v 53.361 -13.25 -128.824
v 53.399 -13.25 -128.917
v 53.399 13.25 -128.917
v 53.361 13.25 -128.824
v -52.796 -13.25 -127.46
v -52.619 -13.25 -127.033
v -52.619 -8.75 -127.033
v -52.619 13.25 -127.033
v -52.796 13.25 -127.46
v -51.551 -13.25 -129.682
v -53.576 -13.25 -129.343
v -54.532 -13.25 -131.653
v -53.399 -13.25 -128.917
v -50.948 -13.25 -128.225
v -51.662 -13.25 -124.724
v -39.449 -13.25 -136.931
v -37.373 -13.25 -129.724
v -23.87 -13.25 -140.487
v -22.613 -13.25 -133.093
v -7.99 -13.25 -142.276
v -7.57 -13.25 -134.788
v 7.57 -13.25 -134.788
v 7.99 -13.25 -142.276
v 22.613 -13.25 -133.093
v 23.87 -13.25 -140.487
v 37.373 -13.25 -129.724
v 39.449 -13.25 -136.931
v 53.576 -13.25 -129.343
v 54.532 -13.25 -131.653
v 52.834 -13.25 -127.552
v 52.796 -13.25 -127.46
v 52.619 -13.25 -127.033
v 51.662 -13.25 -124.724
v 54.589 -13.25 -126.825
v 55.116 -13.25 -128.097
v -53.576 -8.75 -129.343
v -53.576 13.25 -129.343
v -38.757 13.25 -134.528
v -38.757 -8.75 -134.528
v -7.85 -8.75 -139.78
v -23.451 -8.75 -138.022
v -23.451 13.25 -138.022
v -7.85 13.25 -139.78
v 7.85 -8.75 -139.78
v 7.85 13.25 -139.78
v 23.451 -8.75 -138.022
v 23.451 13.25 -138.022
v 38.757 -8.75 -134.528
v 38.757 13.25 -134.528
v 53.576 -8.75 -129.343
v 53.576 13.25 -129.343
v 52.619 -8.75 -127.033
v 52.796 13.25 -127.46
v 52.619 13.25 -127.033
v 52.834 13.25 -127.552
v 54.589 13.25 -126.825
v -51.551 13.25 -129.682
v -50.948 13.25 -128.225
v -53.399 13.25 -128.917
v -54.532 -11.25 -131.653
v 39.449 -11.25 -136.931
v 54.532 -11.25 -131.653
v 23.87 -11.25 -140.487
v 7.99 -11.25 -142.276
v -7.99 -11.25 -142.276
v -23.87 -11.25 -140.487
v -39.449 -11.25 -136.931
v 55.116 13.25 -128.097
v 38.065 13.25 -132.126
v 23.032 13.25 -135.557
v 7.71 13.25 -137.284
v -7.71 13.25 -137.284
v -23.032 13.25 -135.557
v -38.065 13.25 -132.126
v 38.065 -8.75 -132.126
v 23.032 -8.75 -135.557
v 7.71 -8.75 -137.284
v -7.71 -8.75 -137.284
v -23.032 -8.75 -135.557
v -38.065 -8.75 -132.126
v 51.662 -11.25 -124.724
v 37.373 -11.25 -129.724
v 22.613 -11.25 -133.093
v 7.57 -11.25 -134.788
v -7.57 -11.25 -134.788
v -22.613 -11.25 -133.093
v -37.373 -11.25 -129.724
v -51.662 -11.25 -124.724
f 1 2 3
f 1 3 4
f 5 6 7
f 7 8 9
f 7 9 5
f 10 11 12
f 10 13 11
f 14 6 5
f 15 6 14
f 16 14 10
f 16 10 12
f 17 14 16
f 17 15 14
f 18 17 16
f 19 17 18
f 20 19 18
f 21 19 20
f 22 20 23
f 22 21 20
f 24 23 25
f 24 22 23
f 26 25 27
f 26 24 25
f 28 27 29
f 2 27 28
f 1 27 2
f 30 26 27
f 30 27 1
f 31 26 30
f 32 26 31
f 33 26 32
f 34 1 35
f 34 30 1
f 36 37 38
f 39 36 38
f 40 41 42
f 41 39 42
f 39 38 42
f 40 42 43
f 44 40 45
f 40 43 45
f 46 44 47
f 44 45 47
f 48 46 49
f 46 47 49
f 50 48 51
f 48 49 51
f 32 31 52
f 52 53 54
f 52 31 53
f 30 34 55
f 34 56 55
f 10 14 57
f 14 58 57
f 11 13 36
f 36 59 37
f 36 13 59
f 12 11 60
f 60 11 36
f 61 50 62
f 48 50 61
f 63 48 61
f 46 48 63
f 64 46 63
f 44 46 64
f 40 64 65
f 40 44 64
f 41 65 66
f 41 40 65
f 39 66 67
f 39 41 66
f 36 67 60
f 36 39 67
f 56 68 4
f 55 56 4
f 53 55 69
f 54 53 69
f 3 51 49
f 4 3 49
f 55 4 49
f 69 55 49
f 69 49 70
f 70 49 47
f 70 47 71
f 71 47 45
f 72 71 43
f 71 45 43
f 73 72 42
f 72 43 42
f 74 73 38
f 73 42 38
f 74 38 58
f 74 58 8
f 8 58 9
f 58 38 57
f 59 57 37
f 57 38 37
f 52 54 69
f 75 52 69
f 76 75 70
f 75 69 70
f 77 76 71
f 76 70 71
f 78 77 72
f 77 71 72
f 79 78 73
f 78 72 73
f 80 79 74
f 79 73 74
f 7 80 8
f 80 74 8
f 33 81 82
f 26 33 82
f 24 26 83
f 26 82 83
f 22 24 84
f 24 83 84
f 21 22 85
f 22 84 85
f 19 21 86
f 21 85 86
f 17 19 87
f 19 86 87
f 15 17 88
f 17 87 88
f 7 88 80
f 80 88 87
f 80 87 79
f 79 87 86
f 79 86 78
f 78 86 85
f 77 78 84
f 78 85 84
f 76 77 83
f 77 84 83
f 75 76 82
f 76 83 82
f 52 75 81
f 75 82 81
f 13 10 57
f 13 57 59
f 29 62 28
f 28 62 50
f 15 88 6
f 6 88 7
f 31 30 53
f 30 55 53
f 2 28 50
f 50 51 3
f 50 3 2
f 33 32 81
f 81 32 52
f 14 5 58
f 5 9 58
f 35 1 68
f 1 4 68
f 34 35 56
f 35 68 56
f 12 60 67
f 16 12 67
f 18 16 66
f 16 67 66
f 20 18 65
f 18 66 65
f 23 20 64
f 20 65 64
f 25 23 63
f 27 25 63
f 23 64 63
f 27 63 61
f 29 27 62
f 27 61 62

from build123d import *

# Parameters (mm, degrees)
BOSS_EXTRUDE1_DEPTH = 13.25
BOSS_EXTRUDE2_START = -2
BOSS_EXTRUDE2_DEPTH = 2
CHAMFER2_SIZE       = 2.5


with BuildPart() as part:
    # Sketch2 → Boss-Extrude1 (new, symmetric)
    with BuildSketch(Plane(origin=(0, 0, 0), x_dir=(1, 0, 0), z_dir=(0, 1, 0))):
        with BuildLine():
            Line((-52.61897195, 127.03343572), (-52.795575656, 127.459794782))
            Line((-52.795575656, 127.459794782), (-50.947816591, 128.225161647))
            Line((-50.947816591, 128.225161647), (-51.55131776, 129.682142355))
            Line((-51.55131776, 129.682142355), (-53.399076825, 128.91677549))
            Line((-53.399076825, 128.91677549), (-53.575680531, 129.343134552))
            ThreePointArc((-53.575680531, 129.343134552), (0, 140), (53.575680531, 129.343134552))
            Line((53.575680531, 129.343134552), (53.399076825, 128.91677549))
            Line((53.399076825, 128.91677549), (53.360808482, 128.824387537))
            Line((53.360808482, 128.824387537), (55.116179594, 128.097289015))
            Line((55.116179594, 128.097289015), (54.589215111, 126.825084214))
            Line((54.589215111, 126.825084214), (52.833843999, 127.552182735))
            Line((52.833843999, 127.552182735), (52.795575656, 127.459794782))
            Line((52.795575656, 127.459794782), (52.61897195, 127.03343572))
            ThreePointArc((52.61897195, 127.03343572), (0, 137.5), (-52.61897195, 127.03343572))
        make_face()
    extrude(amount=BOSS_EXTRUDE1_DEPTH, both=True)

    # Sketch3 → Boss-Extrude2 (add)
    with BuildSketch(Plane.XZ.offset(13.25).offset(BOSS_EXTRUDE2_START)):
        with BuildLine():
            ThreePointArc((53.575680531, -129.343134552), (0, -140), (-53.575680531, -129.343134552))
            Line((-53.575680531, -129.343134552), (-54.532389112, -131.652833383))
            ThreePointArc((-54.532389112, -131.652833383), (0, -142.5), (54.532389112, -131.652833383))
            Line((54.532389112, -131.652833383), (53.575680531, -129.343134552))
        make_face()
        with BuildLine():
            Line((-51.662263369, -124.723736889), (-52.61897195, -127.03343572))
            ThreePointArc((-52.61897195, -127.03343572), (0, -137.5), (52.61897195, -127.03343572))
            Line((52.61897195, -127.03343572), (51.662263369, -124.723736889))
            ThreePointArc((51.662263369, -124.723736889), (0, -135), (-51.662263369, -124.723736889))
        make_face()
    extrude(amount=BOSS_EXTRUDE2_DEPTH)

    # Chamfer2
    chamfer2_edges = [part.edges().sort_by_distance(p)[0] for p in [
        (0, -11.25, -137.5),
        (0, -11.25, -140),
    ]]
    chamfer(chamfer2_edges, length=CHAMFER2_SIZE - 0.0001)  # a hair under: the kernel refuses the full size


solid = part.part
